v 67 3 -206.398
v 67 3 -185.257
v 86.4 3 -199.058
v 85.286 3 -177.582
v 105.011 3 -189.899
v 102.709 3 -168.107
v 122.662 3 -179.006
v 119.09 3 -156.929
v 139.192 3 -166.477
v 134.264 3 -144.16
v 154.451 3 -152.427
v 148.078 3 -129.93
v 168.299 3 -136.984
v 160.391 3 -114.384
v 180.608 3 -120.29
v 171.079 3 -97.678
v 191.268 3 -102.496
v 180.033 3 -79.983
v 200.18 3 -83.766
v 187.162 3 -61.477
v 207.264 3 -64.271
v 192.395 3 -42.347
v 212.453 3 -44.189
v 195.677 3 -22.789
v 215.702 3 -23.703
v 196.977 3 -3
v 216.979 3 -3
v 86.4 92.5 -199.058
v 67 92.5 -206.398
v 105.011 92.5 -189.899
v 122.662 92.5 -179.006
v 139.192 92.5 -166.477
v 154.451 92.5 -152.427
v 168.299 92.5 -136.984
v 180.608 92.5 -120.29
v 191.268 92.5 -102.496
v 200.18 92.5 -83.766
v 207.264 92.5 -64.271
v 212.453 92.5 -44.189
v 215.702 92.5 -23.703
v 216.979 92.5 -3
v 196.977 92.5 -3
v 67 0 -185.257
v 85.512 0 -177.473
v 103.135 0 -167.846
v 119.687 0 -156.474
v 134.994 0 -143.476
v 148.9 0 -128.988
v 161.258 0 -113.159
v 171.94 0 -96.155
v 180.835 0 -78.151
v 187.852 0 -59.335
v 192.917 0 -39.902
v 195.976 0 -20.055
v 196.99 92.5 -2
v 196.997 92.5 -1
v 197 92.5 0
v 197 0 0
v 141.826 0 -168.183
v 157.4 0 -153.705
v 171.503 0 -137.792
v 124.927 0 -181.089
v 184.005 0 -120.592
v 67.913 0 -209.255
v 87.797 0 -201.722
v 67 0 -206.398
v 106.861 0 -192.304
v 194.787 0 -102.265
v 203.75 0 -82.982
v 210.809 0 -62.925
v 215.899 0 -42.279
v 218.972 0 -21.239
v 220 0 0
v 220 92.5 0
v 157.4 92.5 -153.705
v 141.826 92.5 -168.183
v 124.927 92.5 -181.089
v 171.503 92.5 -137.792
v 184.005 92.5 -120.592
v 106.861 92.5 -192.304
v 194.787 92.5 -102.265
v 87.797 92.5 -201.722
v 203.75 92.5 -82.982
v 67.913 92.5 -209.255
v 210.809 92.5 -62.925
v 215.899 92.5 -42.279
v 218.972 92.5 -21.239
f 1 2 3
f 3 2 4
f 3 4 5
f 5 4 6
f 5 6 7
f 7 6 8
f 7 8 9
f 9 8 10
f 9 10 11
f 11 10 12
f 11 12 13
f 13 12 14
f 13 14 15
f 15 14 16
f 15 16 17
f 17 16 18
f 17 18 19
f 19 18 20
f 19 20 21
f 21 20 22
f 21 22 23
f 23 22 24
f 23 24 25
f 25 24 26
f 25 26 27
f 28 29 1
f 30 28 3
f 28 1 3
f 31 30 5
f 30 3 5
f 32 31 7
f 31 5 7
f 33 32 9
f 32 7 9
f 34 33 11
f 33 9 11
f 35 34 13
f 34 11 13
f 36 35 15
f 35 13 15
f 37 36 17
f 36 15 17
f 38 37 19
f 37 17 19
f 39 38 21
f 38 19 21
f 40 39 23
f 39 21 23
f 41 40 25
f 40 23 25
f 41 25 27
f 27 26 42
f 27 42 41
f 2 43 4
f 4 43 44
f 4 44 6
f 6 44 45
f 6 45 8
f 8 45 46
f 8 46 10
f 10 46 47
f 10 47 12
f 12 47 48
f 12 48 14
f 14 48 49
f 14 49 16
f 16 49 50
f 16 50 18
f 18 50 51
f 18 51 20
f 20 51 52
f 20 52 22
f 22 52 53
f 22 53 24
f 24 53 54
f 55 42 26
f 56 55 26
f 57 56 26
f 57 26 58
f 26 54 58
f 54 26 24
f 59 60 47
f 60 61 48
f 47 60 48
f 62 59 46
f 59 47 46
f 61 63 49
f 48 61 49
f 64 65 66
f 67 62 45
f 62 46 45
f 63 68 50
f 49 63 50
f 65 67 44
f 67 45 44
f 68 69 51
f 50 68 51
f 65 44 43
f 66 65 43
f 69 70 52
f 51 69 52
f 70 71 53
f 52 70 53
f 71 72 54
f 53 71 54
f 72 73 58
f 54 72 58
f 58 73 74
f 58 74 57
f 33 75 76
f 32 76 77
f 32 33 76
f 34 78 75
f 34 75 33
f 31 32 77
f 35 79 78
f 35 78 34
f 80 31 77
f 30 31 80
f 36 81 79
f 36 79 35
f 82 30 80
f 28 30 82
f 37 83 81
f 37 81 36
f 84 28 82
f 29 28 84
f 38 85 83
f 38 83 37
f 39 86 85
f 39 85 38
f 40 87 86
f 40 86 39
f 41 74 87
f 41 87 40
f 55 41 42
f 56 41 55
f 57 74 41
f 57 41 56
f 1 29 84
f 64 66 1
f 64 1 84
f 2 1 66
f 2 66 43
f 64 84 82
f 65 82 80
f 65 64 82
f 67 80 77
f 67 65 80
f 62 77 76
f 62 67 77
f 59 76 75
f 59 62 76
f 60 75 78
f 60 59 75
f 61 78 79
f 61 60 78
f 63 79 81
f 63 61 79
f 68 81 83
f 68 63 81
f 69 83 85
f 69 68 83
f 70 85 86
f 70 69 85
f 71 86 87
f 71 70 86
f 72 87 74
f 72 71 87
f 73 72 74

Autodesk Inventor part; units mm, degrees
ref_plane "YZ Plane" through (0, 0, 0) normal (1, 0, 0) x (0, 1, 0)
ref_plane "XZ Plane" through (0, 0, 0) normal (0, 1, 0) x (-1, 0, 0)
ref_plane "XY Plane" through (0, 0, 0) normal (0, 0, 1) x (1, 0, 0)
sketch "Sketch1" plane through (0, 0, 0) normal (0, 1, 0) x (-1, 0, 0)
  arc A0 (-220, 0) -> (-67, -209.5495) centre (0, 0) ccw
  arc A1 (-217, 0) -> (-67, -206.3977) centre (0, 0) ccw
  line L0 (-220, 0) -> (-217, 0)
  line L1 (0, -220) -> (0, -217)
  line L2 (0, -220) -> (-67, -220)
  line L3 (0, -220) -> (67, -220) construction
  line L4 (-67, -220) -> (-67, -206.3977)
  line L5 (-67, -206.3977) -> (-65.0308, -207.0265)
  line L6 (-67, -206.3977) -> (-68.4601, -210.9695)
  point P0 (-67.9127, -209.2555)
  dimension "d0" = 440
  dimension "d1" = 3
  dimension "d2" = 67
  dimension "d3" = 180
  dimension "d9" = 90
extrude "Extrusion1" add sketch "Sketch1" along normal blind 92.5 contours L0 A1 L6 A0
sketch "Sketch2" plane through (0, 0, 0) normal (0, -1, 0) x (1, 0, 0)
  arc A0 (67, -206.3977) -> (217, 0) centre (0, 0) ccw projected
  arc A1 (60.8249, -187.3748) -> (197, 0) centre (0, 0) ccw
  line L0 (197, 0) -> (217, 0)
  line L1 (60.8249, -187.3748) -> (67, -206.3977)
  dimension "d6" = 20
extrude "Extrusion2" add sketch "Sketch2" against normal blind 3
sketch "Sketch7" plane through (0, 0, 0) normal (0, -1, 0) x (1, 0, 0)
  arc A0 (60.8249, -187.3748) -> (197, 0) centre (0, 0) ccw projected
  arc A1 (67.9127, -209.2555) -> (220, 0) centre (0, 0) ccw projected
  line L0 (197, 0) -> (220, 0) projected
  line L1 (196.9772, -3) -> (219.9795, -3)
  dimension "d28" = 3
extrude "Extrusion6" add sketch "Sketch7" against normal up to surface (92.5 mm away)
sketch "Sketch8" plane through (0, 3, 0) normal (0, 1, 0) x (1, 0, 0)
  arc A0 (196.9772, 3) -> (60.8249, 187.3748) centre (0, 0) ccw projected
  line L0 (67, 206.3977) -> (60.8249, 187.3748) projected
  line L1 (67, 206.3977) -> (67, 185.2566)
  line L2 (67, 206.3977) -> (88.1411, 206.3977) construction
  dimension "d31" = 90
extrude "Extrusion7" cut sketch "Sketch8" against normal blind 10
properties part number "Bottom_Enclosure_1"
